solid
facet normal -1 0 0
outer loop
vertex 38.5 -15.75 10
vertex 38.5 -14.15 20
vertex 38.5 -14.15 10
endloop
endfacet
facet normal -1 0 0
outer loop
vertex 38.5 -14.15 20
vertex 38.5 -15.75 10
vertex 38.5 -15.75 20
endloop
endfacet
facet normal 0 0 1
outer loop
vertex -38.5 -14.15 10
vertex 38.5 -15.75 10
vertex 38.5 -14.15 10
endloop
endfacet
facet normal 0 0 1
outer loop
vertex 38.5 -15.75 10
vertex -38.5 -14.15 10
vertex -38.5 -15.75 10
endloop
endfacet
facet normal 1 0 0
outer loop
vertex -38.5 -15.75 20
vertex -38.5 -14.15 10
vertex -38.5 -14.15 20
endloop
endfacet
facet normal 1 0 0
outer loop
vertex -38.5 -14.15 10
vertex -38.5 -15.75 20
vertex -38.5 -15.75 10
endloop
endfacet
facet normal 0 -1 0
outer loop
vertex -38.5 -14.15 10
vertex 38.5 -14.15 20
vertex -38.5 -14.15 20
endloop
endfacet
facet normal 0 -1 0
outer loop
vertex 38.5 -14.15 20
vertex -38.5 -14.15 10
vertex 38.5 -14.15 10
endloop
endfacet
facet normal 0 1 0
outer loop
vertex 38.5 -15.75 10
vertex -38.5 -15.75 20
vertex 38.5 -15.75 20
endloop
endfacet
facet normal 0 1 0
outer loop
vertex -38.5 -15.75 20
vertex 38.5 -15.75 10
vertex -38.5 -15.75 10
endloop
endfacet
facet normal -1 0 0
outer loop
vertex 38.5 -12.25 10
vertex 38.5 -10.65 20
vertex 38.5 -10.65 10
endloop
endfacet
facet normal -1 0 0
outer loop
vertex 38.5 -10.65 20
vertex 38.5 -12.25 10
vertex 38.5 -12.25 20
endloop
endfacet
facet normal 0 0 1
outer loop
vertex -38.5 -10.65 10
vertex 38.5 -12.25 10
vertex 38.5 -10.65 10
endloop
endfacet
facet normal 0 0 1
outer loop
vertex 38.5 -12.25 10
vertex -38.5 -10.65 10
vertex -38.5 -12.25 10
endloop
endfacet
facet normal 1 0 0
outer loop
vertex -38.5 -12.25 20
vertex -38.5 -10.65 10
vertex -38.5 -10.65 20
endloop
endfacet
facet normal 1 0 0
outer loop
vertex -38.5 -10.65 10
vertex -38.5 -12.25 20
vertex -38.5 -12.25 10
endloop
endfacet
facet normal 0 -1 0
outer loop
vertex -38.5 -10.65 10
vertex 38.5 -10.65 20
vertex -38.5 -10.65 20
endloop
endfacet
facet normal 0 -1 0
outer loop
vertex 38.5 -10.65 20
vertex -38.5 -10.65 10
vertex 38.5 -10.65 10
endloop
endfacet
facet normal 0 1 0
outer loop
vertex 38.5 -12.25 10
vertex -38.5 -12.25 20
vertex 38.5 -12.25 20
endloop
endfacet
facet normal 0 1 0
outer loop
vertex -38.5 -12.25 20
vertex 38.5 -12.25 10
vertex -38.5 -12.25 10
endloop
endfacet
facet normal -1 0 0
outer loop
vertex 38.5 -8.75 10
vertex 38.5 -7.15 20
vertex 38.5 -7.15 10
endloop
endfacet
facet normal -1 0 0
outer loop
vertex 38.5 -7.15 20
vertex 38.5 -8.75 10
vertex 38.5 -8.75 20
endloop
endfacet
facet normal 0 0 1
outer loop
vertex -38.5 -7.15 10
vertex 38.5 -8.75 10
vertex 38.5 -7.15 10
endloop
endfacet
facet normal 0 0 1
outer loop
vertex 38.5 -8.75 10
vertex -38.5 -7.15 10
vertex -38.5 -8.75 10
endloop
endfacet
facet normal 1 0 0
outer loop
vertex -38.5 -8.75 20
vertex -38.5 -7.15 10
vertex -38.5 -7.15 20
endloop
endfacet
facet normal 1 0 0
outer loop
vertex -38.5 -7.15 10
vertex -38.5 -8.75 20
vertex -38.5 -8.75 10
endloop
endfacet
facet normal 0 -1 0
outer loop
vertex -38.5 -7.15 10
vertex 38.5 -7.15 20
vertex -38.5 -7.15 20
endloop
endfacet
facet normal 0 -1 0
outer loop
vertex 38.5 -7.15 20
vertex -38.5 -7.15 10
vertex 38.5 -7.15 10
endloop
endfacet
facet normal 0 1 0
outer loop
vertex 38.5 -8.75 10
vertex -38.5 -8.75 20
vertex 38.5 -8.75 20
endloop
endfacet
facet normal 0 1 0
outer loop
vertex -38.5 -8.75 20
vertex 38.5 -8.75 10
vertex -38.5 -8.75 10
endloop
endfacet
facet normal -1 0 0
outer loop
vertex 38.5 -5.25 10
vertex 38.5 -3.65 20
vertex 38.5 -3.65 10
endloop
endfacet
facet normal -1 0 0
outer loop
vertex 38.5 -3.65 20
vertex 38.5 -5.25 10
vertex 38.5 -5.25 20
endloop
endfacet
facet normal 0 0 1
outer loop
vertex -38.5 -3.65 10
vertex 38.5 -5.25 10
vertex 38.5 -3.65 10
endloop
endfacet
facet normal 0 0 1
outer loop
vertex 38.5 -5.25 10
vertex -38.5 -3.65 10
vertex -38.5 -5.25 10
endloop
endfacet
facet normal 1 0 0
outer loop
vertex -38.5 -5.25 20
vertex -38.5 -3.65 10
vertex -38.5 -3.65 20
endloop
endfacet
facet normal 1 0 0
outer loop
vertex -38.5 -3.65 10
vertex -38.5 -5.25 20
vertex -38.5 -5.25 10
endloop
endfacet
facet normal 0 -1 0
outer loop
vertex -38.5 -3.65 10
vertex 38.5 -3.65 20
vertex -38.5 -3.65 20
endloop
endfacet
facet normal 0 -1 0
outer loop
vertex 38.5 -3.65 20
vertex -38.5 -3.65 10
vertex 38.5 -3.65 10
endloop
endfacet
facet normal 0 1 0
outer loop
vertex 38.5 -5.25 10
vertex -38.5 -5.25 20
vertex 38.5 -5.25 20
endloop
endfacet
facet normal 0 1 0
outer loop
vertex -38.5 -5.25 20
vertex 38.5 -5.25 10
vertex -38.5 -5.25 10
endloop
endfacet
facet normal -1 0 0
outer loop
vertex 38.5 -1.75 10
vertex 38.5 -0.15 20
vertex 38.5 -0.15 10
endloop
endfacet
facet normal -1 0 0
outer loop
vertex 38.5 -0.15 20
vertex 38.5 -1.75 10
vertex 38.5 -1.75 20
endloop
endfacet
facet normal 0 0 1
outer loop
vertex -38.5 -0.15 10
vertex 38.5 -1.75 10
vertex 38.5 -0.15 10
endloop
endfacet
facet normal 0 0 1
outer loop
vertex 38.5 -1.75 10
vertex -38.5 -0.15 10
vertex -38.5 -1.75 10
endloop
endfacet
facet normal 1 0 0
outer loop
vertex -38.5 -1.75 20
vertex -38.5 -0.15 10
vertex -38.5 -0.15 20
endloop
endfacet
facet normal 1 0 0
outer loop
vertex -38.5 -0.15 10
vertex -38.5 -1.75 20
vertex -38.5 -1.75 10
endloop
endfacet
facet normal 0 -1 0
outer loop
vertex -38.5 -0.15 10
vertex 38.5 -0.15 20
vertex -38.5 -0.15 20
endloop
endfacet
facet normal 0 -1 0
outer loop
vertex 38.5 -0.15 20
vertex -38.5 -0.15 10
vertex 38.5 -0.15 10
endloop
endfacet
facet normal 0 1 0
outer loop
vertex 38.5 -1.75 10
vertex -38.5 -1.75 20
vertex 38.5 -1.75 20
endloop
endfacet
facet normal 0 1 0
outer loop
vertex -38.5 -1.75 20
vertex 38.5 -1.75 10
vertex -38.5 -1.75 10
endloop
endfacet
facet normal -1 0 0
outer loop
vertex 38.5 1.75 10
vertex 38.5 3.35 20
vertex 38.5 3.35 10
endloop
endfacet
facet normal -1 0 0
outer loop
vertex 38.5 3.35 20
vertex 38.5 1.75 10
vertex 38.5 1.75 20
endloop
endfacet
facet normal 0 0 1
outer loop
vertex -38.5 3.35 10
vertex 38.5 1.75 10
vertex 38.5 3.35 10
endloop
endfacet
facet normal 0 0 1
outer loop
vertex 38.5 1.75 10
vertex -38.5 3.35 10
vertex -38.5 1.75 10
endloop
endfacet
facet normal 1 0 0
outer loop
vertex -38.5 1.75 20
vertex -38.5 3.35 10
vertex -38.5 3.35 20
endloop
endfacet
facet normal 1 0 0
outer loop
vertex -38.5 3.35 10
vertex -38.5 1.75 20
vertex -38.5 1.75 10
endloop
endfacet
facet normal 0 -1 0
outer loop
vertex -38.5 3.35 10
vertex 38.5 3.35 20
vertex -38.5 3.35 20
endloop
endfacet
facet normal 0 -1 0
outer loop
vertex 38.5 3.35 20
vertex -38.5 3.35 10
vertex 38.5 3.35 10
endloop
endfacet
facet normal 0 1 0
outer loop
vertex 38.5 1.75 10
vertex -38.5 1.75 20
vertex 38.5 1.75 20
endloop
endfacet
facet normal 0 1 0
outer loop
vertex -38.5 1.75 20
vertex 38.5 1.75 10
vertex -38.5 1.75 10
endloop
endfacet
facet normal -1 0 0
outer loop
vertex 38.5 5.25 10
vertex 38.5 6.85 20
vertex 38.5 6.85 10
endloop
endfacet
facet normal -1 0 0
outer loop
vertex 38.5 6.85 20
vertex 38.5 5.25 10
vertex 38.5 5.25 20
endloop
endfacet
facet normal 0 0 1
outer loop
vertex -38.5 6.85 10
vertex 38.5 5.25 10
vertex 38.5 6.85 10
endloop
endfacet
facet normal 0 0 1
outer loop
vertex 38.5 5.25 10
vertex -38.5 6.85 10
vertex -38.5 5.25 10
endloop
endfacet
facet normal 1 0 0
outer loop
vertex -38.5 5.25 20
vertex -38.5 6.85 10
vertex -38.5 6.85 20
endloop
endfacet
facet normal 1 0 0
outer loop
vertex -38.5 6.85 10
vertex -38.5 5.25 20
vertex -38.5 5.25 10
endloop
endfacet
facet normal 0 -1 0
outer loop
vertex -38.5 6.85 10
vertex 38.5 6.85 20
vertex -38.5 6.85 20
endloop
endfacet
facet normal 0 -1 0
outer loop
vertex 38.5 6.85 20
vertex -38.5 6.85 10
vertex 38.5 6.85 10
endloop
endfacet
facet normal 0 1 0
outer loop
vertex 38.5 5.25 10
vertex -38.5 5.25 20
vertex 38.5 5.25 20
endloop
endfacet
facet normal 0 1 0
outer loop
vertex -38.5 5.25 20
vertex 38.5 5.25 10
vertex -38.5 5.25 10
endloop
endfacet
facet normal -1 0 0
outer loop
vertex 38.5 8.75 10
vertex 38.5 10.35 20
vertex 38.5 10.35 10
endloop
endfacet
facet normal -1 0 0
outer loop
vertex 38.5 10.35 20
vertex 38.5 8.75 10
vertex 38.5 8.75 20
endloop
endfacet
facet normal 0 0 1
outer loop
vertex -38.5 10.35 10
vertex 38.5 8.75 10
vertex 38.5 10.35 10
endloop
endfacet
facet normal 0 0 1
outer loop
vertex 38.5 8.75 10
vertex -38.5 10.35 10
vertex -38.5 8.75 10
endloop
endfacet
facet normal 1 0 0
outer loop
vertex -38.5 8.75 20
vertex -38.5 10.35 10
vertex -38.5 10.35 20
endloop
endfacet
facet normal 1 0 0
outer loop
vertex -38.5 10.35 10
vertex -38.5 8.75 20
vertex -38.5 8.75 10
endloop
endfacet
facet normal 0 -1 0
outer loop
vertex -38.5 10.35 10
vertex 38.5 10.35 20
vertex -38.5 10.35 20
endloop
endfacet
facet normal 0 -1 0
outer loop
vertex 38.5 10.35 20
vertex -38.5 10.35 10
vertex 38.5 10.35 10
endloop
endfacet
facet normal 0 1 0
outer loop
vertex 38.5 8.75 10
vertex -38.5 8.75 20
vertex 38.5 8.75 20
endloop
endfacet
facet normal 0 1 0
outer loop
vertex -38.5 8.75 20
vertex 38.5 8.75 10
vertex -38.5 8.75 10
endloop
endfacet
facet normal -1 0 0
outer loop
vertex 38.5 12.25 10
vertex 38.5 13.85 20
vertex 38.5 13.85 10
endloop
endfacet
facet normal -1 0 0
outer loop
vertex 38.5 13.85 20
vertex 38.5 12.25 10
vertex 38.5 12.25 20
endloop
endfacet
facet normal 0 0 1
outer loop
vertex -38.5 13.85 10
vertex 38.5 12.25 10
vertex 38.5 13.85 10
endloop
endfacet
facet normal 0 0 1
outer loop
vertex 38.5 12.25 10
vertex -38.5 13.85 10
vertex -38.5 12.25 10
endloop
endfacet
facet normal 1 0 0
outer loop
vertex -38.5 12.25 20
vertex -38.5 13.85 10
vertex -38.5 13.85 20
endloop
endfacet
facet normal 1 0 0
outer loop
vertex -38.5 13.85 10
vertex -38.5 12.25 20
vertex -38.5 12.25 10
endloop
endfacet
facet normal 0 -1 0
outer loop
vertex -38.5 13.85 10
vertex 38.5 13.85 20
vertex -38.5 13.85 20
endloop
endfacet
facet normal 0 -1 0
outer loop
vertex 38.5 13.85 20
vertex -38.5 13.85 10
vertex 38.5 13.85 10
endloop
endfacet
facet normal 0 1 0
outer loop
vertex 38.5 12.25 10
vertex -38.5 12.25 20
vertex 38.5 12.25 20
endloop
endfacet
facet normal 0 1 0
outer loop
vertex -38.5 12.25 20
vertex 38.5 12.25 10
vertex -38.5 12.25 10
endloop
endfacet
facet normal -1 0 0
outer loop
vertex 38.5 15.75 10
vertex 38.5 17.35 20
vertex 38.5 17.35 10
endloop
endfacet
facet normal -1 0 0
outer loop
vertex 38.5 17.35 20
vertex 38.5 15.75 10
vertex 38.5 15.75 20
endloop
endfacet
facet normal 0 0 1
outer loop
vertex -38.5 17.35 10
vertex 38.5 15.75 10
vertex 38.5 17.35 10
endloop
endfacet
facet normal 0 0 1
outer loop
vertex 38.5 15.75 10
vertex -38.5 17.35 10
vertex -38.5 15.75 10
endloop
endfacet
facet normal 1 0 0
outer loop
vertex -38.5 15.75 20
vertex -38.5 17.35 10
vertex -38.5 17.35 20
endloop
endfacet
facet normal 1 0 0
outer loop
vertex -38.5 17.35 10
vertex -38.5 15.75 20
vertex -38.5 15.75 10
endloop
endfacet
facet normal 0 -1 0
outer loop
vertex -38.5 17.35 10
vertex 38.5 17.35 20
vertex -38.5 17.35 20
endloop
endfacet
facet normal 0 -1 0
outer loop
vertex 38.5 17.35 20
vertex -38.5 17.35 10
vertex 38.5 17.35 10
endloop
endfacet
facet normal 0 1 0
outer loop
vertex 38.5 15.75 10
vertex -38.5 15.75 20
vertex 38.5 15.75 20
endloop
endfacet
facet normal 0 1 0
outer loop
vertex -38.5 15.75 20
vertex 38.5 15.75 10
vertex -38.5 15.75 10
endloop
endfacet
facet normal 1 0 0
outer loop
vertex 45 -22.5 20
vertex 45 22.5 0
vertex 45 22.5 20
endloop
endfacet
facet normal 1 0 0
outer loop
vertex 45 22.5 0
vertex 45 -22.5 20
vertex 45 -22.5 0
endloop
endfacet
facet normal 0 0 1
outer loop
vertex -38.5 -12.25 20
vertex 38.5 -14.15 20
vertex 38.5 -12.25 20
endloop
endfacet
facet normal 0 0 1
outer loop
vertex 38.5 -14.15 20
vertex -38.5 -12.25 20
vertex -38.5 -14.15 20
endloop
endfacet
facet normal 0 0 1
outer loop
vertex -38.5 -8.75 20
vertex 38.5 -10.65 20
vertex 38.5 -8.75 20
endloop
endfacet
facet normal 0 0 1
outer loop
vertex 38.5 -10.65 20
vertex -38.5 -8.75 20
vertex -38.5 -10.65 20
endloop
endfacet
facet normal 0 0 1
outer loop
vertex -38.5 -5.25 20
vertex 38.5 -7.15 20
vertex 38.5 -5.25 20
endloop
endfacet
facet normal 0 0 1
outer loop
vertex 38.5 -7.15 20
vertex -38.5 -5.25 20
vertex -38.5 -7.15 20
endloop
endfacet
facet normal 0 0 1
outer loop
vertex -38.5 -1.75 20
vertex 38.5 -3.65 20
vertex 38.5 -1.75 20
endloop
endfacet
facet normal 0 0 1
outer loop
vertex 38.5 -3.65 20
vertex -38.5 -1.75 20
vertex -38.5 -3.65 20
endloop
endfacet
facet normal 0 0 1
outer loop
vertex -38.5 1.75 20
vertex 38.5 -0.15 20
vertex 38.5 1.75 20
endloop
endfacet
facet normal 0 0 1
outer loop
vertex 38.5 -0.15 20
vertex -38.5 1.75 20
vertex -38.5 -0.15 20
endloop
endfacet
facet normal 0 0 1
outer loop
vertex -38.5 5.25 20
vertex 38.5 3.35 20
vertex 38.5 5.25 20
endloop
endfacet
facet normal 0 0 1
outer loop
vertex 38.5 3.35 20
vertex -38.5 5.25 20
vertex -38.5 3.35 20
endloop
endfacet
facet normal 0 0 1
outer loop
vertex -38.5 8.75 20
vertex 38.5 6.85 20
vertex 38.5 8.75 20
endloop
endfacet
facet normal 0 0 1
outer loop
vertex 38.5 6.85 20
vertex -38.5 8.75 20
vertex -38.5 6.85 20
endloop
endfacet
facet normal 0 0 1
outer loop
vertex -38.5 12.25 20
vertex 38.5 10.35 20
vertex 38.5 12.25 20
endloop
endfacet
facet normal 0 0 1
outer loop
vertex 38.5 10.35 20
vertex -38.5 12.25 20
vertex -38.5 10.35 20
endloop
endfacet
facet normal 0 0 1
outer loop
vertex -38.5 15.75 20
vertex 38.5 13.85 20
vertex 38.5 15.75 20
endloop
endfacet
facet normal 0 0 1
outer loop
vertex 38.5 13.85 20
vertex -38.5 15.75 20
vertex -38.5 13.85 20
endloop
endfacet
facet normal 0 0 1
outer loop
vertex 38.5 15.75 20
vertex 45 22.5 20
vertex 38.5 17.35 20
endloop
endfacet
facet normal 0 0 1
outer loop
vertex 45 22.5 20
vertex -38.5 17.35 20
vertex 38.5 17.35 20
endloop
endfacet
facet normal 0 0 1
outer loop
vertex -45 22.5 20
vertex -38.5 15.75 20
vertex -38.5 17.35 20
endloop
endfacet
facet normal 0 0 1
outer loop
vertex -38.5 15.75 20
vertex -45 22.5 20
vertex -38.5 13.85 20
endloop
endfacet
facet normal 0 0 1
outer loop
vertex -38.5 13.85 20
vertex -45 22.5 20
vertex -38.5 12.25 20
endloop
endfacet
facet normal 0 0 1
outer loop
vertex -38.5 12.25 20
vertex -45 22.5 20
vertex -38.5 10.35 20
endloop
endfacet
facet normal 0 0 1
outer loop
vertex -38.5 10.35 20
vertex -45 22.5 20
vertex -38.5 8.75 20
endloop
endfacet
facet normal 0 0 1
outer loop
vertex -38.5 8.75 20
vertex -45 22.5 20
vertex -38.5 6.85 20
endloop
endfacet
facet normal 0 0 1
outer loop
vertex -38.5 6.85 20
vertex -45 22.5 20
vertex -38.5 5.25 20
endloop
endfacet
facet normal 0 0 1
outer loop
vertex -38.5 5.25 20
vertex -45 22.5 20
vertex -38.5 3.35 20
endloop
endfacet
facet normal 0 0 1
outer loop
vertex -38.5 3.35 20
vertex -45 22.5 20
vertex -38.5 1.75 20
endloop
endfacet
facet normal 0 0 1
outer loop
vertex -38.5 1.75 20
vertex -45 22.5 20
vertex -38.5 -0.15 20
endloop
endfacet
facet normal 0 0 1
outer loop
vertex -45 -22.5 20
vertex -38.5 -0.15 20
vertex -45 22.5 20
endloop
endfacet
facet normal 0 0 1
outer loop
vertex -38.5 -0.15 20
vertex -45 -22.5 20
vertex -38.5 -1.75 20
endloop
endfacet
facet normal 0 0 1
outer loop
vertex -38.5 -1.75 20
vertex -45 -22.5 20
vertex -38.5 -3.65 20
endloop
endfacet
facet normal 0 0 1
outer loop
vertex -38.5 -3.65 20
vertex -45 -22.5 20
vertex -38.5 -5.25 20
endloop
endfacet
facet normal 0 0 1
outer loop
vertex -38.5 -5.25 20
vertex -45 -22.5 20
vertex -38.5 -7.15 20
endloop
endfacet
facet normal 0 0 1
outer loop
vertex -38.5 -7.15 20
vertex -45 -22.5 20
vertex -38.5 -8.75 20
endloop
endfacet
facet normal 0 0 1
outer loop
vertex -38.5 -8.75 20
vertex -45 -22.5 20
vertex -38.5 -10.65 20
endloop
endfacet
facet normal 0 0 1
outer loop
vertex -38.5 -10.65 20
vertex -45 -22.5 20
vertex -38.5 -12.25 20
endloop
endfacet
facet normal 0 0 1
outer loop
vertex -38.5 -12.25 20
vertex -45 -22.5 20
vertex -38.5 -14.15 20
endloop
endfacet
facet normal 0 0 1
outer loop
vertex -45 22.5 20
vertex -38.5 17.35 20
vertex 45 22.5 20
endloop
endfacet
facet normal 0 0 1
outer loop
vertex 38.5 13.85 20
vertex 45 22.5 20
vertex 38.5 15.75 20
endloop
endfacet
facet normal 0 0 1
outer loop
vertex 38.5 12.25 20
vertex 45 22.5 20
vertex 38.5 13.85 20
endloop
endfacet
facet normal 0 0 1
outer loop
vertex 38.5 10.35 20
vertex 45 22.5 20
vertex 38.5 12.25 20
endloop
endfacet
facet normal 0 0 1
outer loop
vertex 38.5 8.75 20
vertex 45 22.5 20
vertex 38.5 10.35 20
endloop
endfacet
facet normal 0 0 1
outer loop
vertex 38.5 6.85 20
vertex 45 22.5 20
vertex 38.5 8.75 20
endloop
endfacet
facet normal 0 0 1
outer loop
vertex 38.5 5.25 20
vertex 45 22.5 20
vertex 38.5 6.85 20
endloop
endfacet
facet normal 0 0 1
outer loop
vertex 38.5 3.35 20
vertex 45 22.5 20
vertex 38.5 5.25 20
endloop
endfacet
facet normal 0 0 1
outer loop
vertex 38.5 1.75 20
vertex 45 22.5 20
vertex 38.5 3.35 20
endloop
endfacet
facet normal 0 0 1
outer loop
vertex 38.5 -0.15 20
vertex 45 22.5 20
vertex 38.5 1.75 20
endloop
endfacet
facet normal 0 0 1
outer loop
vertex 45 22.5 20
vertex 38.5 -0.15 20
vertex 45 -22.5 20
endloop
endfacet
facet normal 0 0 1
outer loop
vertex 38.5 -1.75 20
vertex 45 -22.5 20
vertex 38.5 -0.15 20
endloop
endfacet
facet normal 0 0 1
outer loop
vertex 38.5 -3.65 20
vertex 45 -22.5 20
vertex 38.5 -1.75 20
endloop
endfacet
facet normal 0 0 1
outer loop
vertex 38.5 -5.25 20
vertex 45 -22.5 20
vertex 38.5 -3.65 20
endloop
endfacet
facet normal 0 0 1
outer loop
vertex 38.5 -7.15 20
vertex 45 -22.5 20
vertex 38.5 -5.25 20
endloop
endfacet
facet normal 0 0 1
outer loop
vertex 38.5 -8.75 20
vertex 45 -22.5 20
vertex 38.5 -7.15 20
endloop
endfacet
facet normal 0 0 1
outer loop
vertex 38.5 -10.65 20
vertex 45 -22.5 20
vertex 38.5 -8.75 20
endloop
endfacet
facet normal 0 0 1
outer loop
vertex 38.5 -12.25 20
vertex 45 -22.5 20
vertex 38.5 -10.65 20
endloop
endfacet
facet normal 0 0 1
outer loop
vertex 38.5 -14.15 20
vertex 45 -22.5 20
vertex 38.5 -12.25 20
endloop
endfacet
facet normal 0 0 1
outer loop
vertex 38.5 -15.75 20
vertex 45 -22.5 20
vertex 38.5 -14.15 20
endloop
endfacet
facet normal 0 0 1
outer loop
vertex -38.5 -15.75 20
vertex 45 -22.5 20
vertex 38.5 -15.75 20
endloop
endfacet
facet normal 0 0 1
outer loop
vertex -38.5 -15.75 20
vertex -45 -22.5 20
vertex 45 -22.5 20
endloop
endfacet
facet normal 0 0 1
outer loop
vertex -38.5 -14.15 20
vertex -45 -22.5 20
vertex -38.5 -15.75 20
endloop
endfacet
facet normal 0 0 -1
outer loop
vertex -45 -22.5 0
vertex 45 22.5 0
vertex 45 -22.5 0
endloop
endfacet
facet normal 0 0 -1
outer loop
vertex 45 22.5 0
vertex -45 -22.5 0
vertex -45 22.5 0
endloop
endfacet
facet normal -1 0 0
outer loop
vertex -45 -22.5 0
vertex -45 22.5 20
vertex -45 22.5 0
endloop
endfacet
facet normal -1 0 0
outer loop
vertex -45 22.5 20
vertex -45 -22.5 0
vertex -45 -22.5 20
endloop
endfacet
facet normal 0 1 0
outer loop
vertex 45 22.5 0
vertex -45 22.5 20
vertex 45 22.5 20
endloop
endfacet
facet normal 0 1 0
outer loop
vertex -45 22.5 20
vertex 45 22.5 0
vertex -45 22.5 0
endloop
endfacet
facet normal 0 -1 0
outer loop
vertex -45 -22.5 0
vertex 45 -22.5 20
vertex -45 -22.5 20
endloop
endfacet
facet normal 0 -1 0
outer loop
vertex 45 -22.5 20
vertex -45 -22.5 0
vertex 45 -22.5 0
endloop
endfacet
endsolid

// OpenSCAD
// Microscope slide drying rack
// Print orientation: base block on XY plane, slots open upward (+Z)

// ---------------- Parameters ----------------
block_len    = 90;    // block length along X (mm)
block_wid    = 45;    // block width along Y (mm)
block_h      = 20;    // block height along Z (mm)

slot_count   = 10;    // number of slide slots
slot_len     = 77;    // slot length along X (mm)
slot_w       = 1.6;   // slot width along Y (mm)
slot_depth   = 10;    // slot depth from top face (mm)
slot_pitch   = 3.5;   // centre-to-centre slot spacing in Y (mm)

eps          = 0.5;   // overshoot so cutters pass the top face

$fn = 64;

// ---------------- Model ----------------
difference() {
    // Base block, centred in X and Y, sitting on z = 0
    translate([-block_len/2, -block_wid/2, 0])
        cube([block_len, block_wid, block_h]);

    // Slot group, centred on the block in X and Y
    for (i = [0 : slot_count - 1]) {
        y = (i - (slot_count - 1)/2) * slot_pitch;
        translate([-slot_len/2, y, block_h - slot_depth])
            cube([slot_len, slot_w, slot_depth + eps]);
    }
}
